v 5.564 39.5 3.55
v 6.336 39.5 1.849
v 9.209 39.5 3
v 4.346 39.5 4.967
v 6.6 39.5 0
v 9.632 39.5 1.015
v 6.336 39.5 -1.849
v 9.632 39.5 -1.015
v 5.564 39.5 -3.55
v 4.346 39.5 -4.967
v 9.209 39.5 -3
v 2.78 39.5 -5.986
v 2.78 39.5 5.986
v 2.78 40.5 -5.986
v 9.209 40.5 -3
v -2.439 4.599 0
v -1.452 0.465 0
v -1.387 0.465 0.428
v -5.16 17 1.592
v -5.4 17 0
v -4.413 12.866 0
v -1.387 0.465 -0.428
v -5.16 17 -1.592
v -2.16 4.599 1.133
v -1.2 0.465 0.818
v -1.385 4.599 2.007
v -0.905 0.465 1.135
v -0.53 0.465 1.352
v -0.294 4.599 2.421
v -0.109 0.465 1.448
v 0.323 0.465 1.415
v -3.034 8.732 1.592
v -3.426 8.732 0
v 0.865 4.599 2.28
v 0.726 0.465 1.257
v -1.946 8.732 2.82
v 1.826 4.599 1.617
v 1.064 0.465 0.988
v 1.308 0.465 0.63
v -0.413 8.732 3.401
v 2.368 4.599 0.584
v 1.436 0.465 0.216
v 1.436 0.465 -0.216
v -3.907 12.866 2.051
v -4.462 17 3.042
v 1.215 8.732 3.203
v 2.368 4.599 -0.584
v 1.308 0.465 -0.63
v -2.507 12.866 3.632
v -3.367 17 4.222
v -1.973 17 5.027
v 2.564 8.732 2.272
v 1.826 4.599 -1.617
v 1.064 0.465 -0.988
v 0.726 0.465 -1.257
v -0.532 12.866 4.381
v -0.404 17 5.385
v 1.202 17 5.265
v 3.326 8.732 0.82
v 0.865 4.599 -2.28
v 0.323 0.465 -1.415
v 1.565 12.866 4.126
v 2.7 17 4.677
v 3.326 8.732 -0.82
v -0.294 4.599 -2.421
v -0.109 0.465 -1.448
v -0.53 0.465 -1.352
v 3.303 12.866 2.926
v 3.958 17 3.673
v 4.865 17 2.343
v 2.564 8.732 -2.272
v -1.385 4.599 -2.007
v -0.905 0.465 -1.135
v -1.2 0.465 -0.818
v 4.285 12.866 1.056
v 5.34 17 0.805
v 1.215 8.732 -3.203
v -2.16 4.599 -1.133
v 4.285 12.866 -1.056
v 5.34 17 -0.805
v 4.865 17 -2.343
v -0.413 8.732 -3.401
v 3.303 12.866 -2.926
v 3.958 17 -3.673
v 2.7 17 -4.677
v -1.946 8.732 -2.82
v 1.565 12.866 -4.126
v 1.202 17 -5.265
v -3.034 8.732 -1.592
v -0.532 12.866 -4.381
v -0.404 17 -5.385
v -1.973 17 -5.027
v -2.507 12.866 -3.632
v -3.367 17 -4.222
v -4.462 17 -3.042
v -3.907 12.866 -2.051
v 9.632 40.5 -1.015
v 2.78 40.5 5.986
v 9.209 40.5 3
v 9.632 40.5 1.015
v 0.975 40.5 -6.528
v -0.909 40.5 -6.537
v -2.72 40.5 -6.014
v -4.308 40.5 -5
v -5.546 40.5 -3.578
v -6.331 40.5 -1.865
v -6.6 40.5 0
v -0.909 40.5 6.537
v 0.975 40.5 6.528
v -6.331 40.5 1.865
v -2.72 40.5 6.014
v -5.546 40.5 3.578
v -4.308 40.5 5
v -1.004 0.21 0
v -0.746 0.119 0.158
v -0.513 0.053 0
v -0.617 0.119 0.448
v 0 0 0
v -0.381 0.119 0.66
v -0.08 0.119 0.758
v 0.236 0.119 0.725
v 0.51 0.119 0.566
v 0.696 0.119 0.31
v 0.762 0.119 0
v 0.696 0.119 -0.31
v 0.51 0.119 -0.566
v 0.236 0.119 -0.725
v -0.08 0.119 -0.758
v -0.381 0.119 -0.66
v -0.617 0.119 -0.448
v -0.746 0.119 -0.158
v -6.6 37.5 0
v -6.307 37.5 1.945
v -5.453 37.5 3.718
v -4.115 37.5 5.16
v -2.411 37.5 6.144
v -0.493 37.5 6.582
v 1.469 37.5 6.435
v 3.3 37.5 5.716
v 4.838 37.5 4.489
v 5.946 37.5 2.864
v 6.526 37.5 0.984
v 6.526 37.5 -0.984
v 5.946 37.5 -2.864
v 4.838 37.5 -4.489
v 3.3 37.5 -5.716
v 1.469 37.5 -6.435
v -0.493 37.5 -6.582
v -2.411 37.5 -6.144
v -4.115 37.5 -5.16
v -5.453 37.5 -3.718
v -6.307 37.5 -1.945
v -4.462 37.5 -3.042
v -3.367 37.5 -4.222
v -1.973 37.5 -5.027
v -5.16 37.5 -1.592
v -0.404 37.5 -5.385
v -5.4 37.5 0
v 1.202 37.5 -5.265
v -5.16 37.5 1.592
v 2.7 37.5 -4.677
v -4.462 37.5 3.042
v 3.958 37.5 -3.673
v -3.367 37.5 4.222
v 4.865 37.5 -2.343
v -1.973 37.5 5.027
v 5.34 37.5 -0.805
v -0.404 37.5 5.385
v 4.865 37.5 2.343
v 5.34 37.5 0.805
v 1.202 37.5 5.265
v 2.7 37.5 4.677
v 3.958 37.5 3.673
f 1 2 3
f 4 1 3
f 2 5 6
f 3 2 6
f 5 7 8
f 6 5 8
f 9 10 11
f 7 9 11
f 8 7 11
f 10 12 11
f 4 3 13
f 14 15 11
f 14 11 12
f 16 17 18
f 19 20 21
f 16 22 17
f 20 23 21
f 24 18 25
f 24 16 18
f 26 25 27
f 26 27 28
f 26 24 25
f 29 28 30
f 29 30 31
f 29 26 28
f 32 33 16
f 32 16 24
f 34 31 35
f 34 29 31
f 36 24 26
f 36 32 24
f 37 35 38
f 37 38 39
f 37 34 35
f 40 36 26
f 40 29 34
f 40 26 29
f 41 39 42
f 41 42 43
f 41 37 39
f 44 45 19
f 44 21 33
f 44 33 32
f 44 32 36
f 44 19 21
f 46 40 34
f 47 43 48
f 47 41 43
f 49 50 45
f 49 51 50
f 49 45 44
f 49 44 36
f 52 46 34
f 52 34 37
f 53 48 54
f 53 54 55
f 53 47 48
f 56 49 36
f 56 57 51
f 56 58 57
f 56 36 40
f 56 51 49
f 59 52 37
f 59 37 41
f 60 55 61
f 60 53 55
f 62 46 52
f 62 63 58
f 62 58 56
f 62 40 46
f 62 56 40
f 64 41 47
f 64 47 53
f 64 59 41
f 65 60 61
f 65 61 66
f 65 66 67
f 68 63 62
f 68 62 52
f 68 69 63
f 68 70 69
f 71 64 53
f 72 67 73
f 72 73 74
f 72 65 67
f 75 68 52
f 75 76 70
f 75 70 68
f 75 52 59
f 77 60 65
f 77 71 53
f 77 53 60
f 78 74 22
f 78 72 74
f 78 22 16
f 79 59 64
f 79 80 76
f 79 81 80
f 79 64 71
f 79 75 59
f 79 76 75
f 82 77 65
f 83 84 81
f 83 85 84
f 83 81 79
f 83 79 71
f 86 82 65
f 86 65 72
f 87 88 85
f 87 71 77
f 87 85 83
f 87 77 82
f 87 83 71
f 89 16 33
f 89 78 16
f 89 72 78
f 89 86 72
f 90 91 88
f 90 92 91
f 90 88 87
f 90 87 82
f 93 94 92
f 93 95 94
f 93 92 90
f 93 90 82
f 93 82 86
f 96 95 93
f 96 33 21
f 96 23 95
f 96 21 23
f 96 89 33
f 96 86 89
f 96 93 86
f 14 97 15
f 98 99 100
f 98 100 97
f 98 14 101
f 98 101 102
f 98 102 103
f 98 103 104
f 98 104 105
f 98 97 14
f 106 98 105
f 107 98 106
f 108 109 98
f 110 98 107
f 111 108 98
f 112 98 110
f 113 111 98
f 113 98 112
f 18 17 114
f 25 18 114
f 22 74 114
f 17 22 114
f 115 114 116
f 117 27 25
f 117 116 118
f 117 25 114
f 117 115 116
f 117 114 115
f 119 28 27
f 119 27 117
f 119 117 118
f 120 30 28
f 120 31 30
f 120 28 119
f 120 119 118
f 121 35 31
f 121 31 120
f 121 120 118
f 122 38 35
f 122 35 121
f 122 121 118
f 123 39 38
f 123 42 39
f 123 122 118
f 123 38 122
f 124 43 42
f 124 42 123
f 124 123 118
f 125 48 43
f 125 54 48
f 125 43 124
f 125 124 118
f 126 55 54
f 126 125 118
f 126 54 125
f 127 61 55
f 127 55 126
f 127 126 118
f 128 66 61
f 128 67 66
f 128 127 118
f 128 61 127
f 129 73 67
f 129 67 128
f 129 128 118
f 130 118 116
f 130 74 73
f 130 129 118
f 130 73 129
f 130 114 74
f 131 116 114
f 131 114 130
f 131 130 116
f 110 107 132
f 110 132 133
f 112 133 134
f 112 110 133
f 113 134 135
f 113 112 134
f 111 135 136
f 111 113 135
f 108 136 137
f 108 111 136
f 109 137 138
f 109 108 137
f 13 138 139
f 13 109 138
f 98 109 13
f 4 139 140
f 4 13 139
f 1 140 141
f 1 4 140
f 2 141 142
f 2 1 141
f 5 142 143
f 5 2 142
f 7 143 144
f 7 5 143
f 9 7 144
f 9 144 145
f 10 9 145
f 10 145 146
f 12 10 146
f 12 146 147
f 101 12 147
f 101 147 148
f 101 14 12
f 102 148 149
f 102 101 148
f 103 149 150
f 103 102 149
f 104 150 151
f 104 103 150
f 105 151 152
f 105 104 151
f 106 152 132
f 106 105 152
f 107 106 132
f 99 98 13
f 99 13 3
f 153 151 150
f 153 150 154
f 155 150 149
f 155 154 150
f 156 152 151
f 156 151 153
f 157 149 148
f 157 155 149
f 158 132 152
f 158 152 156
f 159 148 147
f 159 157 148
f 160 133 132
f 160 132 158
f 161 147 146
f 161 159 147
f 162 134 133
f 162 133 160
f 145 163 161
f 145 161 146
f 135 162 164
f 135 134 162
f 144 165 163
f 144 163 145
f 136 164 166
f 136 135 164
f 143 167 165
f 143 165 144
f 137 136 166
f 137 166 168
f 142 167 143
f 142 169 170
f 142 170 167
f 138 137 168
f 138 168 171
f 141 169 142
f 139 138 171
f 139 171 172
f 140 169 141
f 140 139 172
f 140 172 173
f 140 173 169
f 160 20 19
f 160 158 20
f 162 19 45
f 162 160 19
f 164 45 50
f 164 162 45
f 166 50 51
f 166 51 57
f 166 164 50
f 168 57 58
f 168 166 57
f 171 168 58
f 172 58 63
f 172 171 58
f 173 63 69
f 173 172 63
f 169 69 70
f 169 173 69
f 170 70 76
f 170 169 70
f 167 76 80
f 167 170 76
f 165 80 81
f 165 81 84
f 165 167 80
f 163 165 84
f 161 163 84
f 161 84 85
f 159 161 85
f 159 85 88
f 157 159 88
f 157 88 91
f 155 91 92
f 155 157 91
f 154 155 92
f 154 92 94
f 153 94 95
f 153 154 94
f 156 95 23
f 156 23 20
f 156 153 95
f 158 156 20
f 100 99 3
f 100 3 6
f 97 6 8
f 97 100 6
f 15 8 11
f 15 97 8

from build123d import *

# Parameters (mm, degrees)
SALIENTE_EXTRUIR1_DEPTH = 1


with BuildPart() as part:
    # Croquis1 → Revolución1 (revolve)
    with BuildSketch(Plane.XY, mode=Mode.PRIVATE) as revoluci_n1_sk:
        with BuildLine():
            Line((0, 40.5), (0, 0))
            ThreePointArc((0, 0), (0.762242399, 0.119036639), (1.451896979, 0.46481078))
            Line((1.451896979, 0.46481078), (5.4, 17))
            Line((5.4, 17), (5.4, 37.5))
            Line((5.4, 37.5), (6.6, 37.5))
            Line((6.6, 37.5), (6.6, 40.5))
            Line((6.6, 40.5), (0, 40.5))
        make_face()
    revolve(revoluci_n1_sk.sketch.rotate(Axis((0, 0, 0), (0, 1, 0)), 180), axis=Axis((0, 0, 0), (0, 1, 0)))

    # Croquis2 → Saliente-Extruir1 (add)
    with BuildSketch(Plane(origin=(0, 40.5, 0), x_dir=(1, 0, 0), z_dir=(0, 1, 0))):
        with BuildLine():
            Line((9.209038218, 3), (2.780130903, 5.985889421))
            ThreePointArc((2.780130903, 5.985889421), (6.6, 0), (2.780130903, -5.985889421))
            Line((2.780130903, -5.985889421), (9.209038218, -3))
            ThreePointArc((9.209038218, -3), (9.685369631, 0), (9.209038218, 3))
        make_face()
    extrude(amount=-SALIENTE_EXTRUIR1_DEPTH)


solid = part.part
